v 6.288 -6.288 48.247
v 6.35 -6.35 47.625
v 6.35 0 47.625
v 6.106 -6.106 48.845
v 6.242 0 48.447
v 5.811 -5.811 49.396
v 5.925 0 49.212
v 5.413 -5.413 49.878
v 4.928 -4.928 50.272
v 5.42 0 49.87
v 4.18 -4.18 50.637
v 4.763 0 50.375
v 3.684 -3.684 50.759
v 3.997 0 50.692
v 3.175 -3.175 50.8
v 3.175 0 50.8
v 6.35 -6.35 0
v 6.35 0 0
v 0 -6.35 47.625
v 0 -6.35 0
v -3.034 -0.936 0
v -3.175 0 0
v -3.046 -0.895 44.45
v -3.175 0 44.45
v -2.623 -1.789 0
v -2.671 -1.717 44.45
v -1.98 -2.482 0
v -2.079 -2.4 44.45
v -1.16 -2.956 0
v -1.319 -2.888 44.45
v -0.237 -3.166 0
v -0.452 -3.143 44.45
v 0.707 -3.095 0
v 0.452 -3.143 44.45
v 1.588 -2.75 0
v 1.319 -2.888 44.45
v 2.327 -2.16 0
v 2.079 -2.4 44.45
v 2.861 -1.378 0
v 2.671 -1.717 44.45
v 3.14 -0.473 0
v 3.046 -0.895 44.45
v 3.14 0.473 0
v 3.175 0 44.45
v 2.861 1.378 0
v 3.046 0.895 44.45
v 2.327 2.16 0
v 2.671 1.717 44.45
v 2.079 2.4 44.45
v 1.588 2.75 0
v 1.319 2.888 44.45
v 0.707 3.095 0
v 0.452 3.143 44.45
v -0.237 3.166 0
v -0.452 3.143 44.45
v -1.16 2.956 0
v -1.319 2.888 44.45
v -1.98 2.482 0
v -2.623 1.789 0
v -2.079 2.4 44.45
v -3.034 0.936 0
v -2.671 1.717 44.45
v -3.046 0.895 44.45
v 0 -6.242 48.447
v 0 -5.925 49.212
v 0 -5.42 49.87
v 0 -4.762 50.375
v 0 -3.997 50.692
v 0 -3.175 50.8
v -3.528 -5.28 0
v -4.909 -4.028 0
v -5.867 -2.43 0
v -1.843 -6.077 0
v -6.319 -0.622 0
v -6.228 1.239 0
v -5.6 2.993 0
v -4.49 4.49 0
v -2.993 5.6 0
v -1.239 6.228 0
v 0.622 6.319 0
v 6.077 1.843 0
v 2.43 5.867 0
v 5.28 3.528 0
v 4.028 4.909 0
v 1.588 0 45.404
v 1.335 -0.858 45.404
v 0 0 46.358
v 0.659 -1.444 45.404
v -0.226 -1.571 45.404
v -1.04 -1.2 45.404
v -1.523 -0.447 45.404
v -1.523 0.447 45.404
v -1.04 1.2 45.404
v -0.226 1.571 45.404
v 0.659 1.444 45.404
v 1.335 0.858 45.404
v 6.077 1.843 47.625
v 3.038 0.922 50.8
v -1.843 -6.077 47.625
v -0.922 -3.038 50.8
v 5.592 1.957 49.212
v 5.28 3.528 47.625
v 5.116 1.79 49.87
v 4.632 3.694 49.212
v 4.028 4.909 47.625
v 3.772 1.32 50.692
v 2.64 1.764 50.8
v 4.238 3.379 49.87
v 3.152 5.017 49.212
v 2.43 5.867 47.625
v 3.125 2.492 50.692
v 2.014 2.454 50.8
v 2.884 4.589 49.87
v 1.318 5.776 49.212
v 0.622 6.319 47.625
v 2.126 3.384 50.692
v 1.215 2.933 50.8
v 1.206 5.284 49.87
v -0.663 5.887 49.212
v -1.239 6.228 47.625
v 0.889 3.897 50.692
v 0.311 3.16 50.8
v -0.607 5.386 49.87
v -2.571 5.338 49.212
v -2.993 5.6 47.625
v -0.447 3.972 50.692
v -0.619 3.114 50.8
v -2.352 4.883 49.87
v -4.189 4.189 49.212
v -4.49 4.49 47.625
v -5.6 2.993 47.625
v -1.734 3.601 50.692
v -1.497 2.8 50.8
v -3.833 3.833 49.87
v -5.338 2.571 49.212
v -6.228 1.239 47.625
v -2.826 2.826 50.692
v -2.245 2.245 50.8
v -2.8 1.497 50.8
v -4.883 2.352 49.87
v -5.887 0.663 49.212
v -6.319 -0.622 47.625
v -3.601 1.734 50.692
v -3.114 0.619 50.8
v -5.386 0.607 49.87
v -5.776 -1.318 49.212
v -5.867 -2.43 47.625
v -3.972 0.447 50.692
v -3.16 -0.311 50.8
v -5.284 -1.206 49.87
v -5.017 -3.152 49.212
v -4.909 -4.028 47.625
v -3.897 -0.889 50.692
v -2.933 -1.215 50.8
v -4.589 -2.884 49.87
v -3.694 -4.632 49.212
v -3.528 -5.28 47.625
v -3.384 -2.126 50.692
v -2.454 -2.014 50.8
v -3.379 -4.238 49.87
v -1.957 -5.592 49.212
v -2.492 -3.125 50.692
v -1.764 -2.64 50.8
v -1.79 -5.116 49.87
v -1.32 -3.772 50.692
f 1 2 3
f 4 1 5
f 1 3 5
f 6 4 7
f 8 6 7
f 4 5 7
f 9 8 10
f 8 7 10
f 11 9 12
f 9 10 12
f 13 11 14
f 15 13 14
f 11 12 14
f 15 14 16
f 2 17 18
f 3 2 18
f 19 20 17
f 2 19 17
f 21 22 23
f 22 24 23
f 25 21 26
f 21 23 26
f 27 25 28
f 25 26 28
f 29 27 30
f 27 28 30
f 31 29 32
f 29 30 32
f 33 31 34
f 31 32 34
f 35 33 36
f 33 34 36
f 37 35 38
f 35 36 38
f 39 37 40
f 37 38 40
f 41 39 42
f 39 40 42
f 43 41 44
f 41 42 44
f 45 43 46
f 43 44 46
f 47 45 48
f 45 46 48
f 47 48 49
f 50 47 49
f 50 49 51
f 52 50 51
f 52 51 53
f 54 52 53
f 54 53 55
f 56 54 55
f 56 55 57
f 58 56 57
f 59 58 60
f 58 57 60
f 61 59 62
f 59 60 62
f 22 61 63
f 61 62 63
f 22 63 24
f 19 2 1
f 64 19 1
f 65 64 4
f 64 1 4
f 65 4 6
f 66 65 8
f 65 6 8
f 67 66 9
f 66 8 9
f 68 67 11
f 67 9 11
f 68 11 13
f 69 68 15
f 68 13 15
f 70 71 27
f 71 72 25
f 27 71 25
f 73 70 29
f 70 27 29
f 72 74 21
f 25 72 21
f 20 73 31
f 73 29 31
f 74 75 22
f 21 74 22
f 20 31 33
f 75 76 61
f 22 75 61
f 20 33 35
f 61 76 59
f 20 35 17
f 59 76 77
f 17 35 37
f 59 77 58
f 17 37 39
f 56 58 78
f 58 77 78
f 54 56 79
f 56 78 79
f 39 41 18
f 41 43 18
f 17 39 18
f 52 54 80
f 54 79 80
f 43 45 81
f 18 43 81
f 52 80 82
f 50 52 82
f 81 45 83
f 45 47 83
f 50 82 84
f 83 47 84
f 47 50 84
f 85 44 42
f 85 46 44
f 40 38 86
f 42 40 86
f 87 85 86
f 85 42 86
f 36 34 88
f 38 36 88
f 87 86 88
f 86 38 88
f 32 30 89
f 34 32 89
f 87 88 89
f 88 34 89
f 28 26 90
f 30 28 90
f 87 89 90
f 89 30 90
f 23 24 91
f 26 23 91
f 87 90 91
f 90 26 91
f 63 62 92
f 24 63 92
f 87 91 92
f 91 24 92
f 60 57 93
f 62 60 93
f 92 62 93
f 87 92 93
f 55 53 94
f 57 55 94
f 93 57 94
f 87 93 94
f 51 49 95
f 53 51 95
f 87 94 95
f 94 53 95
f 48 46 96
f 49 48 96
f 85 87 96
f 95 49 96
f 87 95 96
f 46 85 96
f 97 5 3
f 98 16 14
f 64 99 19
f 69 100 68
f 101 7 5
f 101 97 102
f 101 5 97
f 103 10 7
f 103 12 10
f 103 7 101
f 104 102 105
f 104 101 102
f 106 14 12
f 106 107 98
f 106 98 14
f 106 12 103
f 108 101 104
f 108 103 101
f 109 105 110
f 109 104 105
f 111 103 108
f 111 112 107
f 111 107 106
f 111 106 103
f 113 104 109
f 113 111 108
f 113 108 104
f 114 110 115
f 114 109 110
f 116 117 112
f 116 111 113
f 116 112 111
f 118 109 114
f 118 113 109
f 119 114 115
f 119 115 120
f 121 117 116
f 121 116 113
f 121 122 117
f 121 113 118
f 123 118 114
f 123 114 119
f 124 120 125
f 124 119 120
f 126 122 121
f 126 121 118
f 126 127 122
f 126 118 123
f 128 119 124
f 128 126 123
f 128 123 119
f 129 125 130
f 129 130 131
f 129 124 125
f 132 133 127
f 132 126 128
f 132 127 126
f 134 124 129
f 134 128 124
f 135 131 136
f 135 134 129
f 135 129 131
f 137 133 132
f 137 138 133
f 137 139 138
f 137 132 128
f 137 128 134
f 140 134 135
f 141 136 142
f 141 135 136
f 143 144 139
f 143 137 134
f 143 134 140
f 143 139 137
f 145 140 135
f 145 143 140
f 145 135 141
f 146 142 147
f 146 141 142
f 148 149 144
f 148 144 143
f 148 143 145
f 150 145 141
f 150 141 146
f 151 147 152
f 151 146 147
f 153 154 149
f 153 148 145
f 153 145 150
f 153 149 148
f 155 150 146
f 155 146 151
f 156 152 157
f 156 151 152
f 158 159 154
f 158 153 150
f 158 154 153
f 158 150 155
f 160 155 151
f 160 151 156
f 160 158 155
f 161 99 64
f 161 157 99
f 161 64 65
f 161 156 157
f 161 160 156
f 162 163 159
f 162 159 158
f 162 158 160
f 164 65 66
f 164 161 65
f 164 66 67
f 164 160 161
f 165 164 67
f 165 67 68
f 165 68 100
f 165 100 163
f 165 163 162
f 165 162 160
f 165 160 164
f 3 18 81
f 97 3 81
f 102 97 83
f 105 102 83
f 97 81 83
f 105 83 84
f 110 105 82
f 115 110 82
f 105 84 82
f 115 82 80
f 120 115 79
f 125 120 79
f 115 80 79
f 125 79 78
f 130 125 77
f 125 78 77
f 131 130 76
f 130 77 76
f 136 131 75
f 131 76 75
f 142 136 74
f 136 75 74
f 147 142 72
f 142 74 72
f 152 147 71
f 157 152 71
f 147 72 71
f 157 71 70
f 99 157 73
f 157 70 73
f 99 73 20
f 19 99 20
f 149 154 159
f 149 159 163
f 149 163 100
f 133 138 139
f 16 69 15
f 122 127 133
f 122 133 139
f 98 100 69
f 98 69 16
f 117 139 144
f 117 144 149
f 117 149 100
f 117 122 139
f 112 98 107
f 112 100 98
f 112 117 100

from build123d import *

# Parameters (mm, degrees)
F1_DEPTH = 50.8
F2_R     = 3.175
F3_D     = 6.35
F3_DEPTH = 44.45
F3_TIP   = 1.9077324654


with BuildPart() as f1:
    # F0 (on Top) → F1 (new body)
    with BuildSketch(Plane.XY):
        with BuildLine():
            Line((6.35, -6.35), (6.35, 0))
            ThreePointArc((6.35, 0), (-4.4901280605, 4.4901280605), (0, -6.35))
            Line((0, -6.35), (6.35, -6.35))
        make_face()
    extrude(amount=F1_DEPTH)

    # F2
    f2_edges = [f1.edges().sort_by_distance(p)[0] for p in [
        (3.175, -6.35, 50.8),
        (6.35, -3.175, 50.8),
        (-4.490128, 4.490128, 50.8),
    ]]
    fillet(f2_edges, radius=F2_R)

    # F3
    with Locations(Plane(origin=(0, 0, 0), x_dir=(1, 0, 0), z_dir=(0, 0, -1))):
        with Locations((0, 0)):
            Hole(F3_D / 2, depth=F3_DEPTH)
            with Locations((0, 0, -(F3_DEPTH + F3_TIP / 2))):  # 118° drill point
                Cone(0, F3_D / 2, F3_TIP, mode=Mode.SUBTRACT)


solid = f1.part
